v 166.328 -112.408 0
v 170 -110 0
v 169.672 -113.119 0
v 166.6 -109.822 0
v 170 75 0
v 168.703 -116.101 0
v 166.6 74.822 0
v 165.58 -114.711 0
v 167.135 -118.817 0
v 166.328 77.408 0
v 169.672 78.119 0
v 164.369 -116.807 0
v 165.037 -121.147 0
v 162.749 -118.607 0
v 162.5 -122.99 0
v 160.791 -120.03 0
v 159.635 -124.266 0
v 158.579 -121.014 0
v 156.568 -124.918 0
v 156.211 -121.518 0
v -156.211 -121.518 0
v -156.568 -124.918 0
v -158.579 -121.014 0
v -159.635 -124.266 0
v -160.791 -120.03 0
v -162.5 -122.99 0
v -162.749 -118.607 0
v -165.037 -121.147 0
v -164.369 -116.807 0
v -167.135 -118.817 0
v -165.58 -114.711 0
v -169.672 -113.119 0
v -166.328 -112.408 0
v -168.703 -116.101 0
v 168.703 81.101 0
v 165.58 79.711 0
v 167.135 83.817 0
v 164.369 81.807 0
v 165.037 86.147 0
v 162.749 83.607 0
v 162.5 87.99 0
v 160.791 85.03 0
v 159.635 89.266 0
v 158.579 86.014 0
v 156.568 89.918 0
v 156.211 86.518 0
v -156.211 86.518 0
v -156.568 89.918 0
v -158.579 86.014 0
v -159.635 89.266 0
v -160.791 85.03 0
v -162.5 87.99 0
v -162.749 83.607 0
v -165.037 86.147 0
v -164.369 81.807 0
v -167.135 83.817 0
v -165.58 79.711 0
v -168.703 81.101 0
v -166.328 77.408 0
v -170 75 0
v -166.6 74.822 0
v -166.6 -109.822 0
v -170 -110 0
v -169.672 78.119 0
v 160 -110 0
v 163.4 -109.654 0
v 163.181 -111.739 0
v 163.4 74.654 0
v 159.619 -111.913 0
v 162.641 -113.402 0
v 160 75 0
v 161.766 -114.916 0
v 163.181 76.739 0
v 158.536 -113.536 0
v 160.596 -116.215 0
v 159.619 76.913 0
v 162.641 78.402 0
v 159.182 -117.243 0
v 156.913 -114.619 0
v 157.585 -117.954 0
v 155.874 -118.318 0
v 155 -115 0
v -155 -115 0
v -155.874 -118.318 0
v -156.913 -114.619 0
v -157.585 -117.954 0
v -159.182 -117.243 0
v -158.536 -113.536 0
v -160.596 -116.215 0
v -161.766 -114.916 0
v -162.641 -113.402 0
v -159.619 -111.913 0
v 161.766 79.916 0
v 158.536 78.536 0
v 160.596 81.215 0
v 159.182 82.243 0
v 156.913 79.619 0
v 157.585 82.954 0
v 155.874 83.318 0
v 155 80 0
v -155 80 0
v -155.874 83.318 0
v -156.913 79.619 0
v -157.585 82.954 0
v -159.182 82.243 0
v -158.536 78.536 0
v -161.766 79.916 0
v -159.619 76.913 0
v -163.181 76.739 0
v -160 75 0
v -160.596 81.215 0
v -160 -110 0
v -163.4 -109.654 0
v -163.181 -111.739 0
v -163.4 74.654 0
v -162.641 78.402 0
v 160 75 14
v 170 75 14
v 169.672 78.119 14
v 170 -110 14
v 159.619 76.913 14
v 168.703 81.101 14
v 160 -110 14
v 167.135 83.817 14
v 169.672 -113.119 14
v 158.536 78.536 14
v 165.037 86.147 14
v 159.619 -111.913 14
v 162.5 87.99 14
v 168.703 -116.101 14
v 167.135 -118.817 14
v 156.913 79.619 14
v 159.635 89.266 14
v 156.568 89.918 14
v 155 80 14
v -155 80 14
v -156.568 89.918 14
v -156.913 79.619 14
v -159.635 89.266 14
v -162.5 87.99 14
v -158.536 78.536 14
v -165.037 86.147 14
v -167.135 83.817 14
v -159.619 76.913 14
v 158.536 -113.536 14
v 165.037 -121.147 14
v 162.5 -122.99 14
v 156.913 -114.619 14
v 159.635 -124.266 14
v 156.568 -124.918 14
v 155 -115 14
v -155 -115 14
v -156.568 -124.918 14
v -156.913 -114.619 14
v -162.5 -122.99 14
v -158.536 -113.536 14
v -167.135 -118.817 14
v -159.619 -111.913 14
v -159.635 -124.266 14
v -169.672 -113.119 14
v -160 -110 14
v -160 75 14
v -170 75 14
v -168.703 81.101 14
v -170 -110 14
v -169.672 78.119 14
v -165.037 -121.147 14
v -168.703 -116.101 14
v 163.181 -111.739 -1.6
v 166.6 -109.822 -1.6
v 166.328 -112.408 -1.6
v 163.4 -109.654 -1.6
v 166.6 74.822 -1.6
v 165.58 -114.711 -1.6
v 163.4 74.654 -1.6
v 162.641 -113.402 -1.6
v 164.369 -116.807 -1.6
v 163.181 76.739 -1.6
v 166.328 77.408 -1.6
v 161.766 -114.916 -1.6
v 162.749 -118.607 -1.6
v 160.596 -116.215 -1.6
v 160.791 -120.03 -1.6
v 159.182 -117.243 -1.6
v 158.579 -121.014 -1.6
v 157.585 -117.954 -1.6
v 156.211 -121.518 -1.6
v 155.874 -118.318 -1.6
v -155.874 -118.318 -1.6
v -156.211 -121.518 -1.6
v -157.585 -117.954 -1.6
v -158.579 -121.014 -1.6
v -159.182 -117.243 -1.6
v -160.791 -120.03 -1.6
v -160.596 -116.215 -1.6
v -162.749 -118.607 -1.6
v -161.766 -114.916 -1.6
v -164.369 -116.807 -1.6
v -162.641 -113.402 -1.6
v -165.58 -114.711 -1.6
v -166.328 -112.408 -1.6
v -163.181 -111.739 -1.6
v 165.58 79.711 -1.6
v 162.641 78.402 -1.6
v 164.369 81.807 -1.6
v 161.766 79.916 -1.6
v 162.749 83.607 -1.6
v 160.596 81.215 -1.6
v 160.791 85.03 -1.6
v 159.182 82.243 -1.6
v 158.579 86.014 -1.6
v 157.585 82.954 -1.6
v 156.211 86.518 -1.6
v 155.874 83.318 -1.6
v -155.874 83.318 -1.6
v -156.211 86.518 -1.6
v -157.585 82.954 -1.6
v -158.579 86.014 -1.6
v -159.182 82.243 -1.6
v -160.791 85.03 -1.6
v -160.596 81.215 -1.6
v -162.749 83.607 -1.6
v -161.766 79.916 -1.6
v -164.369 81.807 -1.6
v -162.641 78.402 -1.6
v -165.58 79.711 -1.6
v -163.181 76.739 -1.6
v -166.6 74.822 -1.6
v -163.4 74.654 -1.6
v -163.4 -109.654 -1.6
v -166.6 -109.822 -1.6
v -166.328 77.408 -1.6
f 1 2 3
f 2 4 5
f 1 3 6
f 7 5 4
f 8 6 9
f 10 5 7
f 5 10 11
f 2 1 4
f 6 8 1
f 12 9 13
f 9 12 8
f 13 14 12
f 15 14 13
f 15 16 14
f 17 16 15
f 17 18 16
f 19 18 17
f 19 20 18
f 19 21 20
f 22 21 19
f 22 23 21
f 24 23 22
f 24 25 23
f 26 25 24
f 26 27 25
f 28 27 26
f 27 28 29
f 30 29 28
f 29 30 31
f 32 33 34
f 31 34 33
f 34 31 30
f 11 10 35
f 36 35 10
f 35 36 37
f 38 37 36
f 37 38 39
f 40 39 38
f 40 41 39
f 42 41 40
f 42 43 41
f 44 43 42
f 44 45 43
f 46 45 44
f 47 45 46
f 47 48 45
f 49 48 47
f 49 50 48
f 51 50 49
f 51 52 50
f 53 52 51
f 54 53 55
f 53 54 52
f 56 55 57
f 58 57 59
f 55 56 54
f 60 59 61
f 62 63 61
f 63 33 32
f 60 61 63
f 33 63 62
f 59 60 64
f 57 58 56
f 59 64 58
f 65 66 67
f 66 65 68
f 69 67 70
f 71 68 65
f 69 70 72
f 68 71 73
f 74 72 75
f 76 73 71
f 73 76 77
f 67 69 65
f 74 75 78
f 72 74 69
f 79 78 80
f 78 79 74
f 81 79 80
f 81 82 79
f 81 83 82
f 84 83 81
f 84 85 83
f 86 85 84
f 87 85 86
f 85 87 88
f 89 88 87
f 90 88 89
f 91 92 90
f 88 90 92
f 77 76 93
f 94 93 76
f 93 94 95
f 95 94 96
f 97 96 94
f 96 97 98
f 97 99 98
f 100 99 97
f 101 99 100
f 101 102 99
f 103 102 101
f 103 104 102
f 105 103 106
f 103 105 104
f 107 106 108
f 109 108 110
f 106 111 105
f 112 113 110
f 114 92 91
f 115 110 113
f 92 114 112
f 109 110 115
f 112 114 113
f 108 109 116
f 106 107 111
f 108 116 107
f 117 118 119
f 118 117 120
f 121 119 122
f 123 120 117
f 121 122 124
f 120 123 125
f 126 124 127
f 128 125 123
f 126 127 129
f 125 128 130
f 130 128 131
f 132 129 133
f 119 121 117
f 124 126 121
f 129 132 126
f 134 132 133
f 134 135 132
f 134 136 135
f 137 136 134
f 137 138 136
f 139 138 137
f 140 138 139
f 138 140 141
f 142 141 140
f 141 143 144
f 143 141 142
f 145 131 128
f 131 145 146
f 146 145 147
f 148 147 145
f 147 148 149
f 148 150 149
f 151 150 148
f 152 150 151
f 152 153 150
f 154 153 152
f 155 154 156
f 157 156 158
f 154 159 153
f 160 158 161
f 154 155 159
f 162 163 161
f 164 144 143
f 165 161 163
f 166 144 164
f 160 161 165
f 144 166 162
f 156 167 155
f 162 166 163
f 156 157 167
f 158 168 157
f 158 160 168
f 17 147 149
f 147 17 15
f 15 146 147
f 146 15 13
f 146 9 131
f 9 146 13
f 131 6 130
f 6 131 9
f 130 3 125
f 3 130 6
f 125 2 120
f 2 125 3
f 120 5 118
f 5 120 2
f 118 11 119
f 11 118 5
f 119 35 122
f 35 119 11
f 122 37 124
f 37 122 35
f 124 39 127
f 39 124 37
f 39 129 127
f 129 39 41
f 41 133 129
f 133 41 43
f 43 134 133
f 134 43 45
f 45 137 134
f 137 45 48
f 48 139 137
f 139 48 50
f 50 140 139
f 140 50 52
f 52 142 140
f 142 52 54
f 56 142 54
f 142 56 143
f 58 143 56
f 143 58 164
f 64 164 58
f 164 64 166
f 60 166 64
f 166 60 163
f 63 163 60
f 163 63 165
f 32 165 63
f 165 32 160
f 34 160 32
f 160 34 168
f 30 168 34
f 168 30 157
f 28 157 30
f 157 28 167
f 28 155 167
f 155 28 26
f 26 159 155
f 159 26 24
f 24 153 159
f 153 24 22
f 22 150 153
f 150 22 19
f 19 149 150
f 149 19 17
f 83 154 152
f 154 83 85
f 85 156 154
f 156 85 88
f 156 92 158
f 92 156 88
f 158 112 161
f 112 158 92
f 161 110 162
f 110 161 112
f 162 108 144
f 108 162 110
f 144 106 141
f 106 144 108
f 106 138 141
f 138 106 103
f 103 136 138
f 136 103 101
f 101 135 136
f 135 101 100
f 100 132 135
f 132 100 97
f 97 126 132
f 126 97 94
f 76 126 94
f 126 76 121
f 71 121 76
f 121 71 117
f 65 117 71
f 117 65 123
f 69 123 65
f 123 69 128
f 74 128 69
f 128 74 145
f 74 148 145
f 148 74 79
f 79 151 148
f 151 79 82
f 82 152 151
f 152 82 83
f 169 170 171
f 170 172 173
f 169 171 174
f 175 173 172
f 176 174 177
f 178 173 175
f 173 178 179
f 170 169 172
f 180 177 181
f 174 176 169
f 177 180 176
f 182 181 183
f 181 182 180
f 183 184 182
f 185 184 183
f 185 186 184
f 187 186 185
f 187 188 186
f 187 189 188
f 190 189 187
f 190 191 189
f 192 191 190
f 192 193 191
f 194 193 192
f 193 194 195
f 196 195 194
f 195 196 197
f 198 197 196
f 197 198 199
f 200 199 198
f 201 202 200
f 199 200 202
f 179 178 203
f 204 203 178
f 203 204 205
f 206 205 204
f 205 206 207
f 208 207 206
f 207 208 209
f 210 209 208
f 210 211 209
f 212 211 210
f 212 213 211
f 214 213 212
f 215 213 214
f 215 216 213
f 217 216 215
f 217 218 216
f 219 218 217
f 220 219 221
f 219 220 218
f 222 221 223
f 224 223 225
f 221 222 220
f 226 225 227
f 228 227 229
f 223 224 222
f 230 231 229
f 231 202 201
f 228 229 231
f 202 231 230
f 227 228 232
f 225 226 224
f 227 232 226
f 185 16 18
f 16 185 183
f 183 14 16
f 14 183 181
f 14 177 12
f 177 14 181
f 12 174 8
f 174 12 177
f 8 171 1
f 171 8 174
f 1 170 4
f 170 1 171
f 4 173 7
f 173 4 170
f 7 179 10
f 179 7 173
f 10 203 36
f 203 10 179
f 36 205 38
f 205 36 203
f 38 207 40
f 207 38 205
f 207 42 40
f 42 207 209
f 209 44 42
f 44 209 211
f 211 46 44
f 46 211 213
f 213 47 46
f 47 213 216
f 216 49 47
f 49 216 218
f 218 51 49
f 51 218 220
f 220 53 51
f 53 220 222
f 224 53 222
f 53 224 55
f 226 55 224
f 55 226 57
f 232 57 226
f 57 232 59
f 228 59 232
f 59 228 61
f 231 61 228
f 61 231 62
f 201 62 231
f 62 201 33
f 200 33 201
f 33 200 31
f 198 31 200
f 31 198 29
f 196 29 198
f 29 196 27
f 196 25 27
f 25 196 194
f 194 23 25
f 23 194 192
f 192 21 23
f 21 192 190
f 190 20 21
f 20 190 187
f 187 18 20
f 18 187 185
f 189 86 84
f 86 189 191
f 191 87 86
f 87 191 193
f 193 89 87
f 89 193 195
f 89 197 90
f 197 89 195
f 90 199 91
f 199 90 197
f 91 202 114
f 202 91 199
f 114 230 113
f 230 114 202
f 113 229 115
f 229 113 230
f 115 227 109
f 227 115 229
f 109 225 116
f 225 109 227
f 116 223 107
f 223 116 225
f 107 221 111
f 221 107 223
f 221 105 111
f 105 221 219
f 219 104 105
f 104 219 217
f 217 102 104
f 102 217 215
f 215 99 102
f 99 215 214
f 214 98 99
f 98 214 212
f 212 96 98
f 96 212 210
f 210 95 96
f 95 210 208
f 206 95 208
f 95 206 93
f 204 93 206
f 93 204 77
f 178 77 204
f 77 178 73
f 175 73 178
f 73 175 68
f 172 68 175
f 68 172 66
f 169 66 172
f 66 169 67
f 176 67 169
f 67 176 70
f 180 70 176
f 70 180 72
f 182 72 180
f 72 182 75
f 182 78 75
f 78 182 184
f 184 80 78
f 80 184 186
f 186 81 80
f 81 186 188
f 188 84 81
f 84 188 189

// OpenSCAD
// file: ../lib/project/util.scad
// lib/project/util.scad

module rounded_rect_2d(size = [10, 10], r = 2) {
  x = size[0];
  y = size[1];
  rr = min(r, min(x, y) / 2);

  hull() {
    for (sx = [-1, 1], sy = [-1, 1]) {
      translate([sx * (x / 2 - rr), sy * (y / 2 - rr)])
        circle(r = rr);
    }
  }
}
// file: ../lib/project/params.scad
// lib/project/params.scad
// Shared project parameters for the final tray and all fit-test models.

debug = false;

// Main tray footprint.
tray_corner_r = 15;

// Top tray shell.
tray_floor_t = 2.4;
tray_wall_h = 14;
top_wall_w = 10;
glue_rabbet_h = 1.6;
glue_rabbet_w = 3.2;
glue_rabbet_side_clearance = 0.5;
glue_rabbet_vertical_clearance = 0.25;

// Underside support lip and rear support section.
support_lip_drop = 15;
support_lip_w = 10;
console_clear_w = 320;
side_lip_run = 170;
tray_w = console_clear_w + 2 * support_lip_w;
tray_d = side_lip_run + support_lip_w;
front_extension = 35;
rear_gap_w = 28;
rear_tongue_side_margin = 20;
rear_tongue_w = tray_w - 2 * rear_tongue_side_margin;
rear_tongue_depth = 34;
rear_tongue_t = 3.6;

// Cup holder location and plug geometry.
cup_spacing = 135;
// Confirmed from fit checks: move plugs 39 mm rearward from the prior position.
cup_y_from_front = 111;
plug_top_d = 90;
plug_bottom_d = 78;
plug_h = 73;
plug_shell_t = 1.6;
plug_clearance_z = 0;
cup_rim_w = 10;
cup_rim_h = 5;

// Fit-test defaults.
test_plug_top_ds = [84, 85, 86];
test_spacing_values = [116, 118, 120];
test_lip_drop_values = [8, 10, 12];
test_rear_tongue_ts = [1.4, 1.8, 2.2];
test_frame_wall_w = 12;
test_front_zone_depth = 100;
test_rear_zone_depth = 56;
test_gap_section_w = 140;
test_coupon_spacing = 18;
test_front_to_back_slice_w = 10;
// main file
// models/tray_rim.scad
// Separate printable rim for the couch console tray.

use <../lib/project/console_tray.scad>;
include <../lib/project/params.scad>;

// ---------- Public parameters (mm) ----------
// Parameters are shared from lib/project/params.scad.

module main() {
  tray_rim_variant(
    tray_w = tray_w,
    tray_d = tray_d,
    front_extension = front_extension,
    tray_corner_r = tray_corner_r,
    tray_wall_h = tray_wall_h,
    top_wall_w = top_wall_w,
    glue_rabbet_h = glue_rabbet_h,
    glue_rabbet_w = glue_rabbet_w,
    glue_rabbet_side_clearance = glue_rabbet_side_clearance,
    glue_rabbet_vertical_clearance = glue_rabbet_vertical_clearance
  );
}

main();
